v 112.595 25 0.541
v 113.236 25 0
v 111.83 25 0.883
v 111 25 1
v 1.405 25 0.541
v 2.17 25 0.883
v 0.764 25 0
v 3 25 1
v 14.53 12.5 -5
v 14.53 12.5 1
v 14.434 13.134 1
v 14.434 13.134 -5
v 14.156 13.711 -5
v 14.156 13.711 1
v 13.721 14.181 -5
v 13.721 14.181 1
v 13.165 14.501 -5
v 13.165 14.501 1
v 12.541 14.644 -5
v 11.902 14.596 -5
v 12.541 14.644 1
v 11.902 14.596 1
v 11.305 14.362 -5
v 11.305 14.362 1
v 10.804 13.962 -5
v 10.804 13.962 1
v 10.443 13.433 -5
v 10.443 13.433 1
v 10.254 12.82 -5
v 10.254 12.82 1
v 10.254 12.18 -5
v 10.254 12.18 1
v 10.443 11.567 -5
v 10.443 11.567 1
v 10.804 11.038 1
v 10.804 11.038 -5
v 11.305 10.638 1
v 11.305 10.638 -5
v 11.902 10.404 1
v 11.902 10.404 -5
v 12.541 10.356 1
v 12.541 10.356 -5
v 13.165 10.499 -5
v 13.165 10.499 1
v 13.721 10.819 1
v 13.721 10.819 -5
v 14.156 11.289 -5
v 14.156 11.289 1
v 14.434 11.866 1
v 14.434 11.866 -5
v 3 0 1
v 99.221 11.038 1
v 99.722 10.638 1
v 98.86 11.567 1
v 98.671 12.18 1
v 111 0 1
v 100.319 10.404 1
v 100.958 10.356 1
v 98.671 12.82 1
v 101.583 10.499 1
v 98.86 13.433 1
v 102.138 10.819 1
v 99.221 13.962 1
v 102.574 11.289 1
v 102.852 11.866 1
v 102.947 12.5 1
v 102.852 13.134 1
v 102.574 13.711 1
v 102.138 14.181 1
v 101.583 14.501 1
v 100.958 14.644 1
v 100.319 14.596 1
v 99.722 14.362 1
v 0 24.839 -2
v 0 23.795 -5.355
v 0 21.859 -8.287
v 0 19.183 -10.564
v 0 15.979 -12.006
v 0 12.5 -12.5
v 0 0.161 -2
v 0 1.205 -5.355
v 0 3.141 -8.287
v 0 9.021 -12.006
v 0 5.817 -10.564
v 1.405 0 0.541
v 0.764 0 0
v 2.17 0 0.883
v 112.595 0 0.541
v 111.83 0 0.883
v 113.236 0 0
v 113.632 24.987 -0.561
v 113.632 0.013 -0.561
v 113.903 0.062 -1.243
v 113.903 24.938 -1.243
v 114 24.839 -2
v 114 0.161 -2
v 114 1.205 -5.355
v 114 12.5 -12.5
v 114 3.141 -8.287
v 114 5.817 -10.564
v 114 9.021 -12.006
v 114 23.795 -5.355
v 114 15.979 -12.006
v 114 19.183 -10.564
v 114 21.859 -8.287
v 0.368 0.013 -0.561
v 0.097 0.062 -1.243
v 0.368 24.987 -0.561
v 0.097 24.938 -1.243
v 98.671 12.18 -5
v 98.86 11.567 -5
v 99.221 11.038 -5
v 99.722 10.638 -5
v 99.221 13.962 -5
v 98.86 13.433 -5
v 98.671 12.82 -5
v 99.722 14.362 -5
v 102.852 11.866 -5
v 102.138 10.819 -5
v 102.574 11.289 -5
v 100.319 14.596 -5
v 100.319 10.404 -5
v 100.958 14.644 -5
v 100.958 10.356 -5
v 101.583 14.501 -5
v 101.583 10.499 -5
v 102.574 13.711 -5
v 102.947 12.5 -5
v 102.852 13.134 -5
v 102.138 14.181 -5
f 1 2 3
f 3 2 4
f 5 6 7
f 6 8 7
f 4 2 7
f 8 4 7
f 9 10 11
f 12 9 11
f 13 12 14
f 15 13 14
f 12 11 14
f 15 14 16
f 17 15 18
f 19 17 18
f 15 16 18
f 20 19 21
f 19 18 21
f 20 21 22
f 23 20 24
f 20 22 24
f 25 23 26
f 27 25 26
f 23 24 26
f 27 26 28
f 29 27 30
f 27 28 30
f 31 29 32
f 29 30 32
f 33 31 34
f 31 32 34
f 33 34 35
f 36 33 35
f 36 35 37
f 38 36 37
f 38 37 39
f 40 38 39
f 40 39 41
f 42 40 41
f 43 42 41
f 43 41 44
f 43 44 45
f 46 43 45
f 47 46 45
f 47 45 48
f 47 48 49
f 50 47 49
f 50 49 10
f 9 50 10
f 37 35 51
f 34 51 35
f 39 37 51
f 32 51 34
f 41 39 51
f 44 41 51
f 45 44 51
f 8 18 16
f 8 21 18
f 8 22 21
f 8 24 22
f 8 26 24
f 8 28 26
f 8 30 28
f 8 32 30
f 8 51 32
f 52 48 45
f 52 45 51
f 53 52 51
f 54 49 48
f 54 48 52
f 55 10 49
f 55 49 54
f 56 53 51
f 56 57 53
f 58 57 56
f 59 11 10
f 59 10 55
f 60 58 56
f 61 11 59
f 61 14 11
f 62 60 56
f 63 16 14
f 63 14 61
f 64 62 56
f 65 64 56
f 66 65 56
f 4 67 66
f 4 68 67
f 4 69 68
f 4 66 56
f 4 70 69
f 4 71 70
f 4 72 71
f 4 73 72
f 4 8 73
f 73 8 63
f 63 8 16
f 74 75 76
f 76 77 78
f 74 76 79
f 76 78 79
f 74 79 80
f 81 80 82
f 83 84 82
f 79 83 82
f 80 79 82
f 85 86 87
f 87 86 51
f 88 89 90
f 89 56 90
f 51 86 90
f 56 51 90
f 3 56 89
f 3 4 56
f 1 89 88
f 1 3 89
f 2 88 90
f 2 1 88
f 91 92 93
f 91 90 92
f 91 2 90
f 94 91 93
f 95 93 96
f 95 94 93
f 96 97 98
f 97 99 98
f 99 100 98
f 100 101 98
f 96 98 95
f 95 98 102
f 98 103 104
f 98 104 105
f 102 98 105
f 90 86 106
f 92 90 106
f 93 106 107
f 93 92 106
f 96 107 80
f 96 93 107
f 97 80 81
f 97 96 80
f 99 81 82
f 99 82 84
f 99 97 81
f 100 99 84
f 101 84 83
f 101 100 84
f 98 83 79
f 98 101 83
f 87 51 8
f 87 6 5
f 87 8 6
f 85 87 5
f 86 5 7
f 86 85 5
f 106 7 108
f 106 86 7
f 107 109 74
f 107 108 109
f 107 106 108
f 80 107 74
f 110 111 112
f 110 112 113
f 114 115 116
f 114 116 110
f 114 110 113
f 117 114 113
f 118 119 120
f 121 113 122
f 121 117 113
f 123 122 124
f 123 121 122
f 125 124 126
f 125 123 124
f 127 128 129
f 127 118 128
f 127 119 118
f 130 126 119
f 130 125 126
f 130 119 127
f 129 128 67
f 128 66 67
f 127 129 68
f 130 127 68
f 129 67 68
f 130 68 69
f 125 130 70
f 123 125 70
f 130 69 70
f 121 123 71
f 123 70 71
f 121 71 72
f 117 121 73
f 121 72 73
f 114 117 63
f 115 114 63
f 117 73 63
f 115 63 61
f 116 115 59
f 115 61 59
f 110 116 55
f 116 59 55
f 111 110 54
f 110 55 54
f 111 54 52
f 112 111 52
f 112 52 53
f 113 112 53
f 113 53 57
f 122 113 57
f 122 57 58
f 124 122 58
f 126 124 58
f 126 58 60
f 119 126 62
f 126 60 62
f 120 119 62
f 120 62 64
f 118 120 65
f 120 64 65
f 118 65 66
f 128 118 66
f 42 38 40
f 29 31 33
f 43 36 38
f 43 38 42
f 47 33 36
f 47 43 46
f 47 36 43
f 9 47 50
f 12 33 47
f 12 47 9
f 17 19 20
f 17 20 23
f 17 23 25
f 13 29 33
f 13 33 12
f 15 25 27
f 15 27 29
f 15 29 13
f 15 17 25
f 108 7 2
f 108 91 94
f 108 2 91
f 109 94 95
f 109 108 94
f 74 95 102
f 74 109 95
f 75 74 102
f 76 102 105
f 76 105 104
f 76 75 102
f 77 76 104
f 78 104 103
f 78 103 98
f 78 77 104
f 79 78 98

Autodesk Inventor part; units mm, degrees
ref_plane "YZ Plane" through (0, 0, 0) normal (1, 0, 0) x (0, 1, 0)
ref_plane "XZ Plane" through (0, 0, 0) normal (0, 1, 0) x (-1, 0, 0)
ref_plane "XY Plane" through (0, 0, 0) normal (0, 0, 1) x (1, 0, 0)
sketch "Sketch1" plane through (0, 0, 0) normal (0, 0, 1) x (1, 0, 0)
  line L0 (0, 0) -> (114, 0)
  line L1 (114, 0) -> (114, 25)
  line L2 (114, 25) -> (0, 25)
  line L3 (0, 25) -> (0, 0)
  dimension "d0" = 25
  dimension "d1" = 114
extrude "Extrusion1" add sketch "Sketch1" against normal blind 12.5
fillet "Fillet1" radius 12.5 2 edges at (57, 25, -12.5) (57, 0, -12.5)
sketch "Sketch2" plane through (0, 0, 0) normal (0, 0, 1) x (1, 0, 0)
  line L0 (114, 0) -> (114, 25) projected
  line L1 (114, 25) -> (0, 25) projected
  line L2 (0, 25) -> (0, 0) projected
  line L3 (0, 0) -> (114, 0) projected
extrude "Extrusion2" add sketch "Sketch2" along normal blind 1
fillet "Fillet2" radius 3 2 edges at (0, 12.5, 1) (114, 12.5, 1)
sketch "Sketch3" plane through (0, 0, 1) normal (0, 0, 1) x (1, 0, 0)
  circle A0 centre (12.38, 6) radius 1.6 projected
  circle A1 centre (12.38, 19) radius 1.6 projected
  circle A2 centre (40.88, 12.5) radius 1.6 projected
  circle A3 centre (72.88, 12.5) radius 1.6 projected
  circle A4 centre (101.38, 6) radius 1.6 projected
  circle A5 centre (101.38, 19) radius 1.6 projected
  circle A6 centre (12.38, 19) radius 2.15
  circle A7 centre (12.38, 6) radius 2.15
  circle A8 centre (40.88, 12.5) radius 2.15
  circle A9 centre (72.88, 12.5) radius 2.15
  circle A10 centre (101.38, 19) radius 2.15
  circle A11 centre (101.38, 6) radius 2.15
  line L0 (3, 0) -> (111, 0) projected
  line L1 (111, 25) -> (3, 25) projected
  circle A12 centre (12.38, 12.5) radius 2.15
  circle A13 centre (100.7971, 12.5) radius 2.15
  point P0 (0, 0)
  dimension "d8" = 4.3
  dimension "d9" = 4.3
  dimension "d10" = 4.3
  dimension "d11" = 4.3
  dimension "d12" = 4.3
  dimension "d13" = 4.3
  dimension "d16" = 25
  dimension "d17" = 4.3
  dimension "d18" = 12.5
  dimension "d19" = 4.3
extrude "Extrusion3" cut sketch "Sketch3" against normal blind 6 contours A12 | A13
equation "\"d9\" = d8"
equation "\"d10\" = d8"
equation "\"d11\" = d8"
equation "\"d12\" = d8"
equation "\"d13\" = d8"
equation "\"d17\" = d8"
equation "\"d18\" = 0.5 * d16"
properties part number "handle_insert"
